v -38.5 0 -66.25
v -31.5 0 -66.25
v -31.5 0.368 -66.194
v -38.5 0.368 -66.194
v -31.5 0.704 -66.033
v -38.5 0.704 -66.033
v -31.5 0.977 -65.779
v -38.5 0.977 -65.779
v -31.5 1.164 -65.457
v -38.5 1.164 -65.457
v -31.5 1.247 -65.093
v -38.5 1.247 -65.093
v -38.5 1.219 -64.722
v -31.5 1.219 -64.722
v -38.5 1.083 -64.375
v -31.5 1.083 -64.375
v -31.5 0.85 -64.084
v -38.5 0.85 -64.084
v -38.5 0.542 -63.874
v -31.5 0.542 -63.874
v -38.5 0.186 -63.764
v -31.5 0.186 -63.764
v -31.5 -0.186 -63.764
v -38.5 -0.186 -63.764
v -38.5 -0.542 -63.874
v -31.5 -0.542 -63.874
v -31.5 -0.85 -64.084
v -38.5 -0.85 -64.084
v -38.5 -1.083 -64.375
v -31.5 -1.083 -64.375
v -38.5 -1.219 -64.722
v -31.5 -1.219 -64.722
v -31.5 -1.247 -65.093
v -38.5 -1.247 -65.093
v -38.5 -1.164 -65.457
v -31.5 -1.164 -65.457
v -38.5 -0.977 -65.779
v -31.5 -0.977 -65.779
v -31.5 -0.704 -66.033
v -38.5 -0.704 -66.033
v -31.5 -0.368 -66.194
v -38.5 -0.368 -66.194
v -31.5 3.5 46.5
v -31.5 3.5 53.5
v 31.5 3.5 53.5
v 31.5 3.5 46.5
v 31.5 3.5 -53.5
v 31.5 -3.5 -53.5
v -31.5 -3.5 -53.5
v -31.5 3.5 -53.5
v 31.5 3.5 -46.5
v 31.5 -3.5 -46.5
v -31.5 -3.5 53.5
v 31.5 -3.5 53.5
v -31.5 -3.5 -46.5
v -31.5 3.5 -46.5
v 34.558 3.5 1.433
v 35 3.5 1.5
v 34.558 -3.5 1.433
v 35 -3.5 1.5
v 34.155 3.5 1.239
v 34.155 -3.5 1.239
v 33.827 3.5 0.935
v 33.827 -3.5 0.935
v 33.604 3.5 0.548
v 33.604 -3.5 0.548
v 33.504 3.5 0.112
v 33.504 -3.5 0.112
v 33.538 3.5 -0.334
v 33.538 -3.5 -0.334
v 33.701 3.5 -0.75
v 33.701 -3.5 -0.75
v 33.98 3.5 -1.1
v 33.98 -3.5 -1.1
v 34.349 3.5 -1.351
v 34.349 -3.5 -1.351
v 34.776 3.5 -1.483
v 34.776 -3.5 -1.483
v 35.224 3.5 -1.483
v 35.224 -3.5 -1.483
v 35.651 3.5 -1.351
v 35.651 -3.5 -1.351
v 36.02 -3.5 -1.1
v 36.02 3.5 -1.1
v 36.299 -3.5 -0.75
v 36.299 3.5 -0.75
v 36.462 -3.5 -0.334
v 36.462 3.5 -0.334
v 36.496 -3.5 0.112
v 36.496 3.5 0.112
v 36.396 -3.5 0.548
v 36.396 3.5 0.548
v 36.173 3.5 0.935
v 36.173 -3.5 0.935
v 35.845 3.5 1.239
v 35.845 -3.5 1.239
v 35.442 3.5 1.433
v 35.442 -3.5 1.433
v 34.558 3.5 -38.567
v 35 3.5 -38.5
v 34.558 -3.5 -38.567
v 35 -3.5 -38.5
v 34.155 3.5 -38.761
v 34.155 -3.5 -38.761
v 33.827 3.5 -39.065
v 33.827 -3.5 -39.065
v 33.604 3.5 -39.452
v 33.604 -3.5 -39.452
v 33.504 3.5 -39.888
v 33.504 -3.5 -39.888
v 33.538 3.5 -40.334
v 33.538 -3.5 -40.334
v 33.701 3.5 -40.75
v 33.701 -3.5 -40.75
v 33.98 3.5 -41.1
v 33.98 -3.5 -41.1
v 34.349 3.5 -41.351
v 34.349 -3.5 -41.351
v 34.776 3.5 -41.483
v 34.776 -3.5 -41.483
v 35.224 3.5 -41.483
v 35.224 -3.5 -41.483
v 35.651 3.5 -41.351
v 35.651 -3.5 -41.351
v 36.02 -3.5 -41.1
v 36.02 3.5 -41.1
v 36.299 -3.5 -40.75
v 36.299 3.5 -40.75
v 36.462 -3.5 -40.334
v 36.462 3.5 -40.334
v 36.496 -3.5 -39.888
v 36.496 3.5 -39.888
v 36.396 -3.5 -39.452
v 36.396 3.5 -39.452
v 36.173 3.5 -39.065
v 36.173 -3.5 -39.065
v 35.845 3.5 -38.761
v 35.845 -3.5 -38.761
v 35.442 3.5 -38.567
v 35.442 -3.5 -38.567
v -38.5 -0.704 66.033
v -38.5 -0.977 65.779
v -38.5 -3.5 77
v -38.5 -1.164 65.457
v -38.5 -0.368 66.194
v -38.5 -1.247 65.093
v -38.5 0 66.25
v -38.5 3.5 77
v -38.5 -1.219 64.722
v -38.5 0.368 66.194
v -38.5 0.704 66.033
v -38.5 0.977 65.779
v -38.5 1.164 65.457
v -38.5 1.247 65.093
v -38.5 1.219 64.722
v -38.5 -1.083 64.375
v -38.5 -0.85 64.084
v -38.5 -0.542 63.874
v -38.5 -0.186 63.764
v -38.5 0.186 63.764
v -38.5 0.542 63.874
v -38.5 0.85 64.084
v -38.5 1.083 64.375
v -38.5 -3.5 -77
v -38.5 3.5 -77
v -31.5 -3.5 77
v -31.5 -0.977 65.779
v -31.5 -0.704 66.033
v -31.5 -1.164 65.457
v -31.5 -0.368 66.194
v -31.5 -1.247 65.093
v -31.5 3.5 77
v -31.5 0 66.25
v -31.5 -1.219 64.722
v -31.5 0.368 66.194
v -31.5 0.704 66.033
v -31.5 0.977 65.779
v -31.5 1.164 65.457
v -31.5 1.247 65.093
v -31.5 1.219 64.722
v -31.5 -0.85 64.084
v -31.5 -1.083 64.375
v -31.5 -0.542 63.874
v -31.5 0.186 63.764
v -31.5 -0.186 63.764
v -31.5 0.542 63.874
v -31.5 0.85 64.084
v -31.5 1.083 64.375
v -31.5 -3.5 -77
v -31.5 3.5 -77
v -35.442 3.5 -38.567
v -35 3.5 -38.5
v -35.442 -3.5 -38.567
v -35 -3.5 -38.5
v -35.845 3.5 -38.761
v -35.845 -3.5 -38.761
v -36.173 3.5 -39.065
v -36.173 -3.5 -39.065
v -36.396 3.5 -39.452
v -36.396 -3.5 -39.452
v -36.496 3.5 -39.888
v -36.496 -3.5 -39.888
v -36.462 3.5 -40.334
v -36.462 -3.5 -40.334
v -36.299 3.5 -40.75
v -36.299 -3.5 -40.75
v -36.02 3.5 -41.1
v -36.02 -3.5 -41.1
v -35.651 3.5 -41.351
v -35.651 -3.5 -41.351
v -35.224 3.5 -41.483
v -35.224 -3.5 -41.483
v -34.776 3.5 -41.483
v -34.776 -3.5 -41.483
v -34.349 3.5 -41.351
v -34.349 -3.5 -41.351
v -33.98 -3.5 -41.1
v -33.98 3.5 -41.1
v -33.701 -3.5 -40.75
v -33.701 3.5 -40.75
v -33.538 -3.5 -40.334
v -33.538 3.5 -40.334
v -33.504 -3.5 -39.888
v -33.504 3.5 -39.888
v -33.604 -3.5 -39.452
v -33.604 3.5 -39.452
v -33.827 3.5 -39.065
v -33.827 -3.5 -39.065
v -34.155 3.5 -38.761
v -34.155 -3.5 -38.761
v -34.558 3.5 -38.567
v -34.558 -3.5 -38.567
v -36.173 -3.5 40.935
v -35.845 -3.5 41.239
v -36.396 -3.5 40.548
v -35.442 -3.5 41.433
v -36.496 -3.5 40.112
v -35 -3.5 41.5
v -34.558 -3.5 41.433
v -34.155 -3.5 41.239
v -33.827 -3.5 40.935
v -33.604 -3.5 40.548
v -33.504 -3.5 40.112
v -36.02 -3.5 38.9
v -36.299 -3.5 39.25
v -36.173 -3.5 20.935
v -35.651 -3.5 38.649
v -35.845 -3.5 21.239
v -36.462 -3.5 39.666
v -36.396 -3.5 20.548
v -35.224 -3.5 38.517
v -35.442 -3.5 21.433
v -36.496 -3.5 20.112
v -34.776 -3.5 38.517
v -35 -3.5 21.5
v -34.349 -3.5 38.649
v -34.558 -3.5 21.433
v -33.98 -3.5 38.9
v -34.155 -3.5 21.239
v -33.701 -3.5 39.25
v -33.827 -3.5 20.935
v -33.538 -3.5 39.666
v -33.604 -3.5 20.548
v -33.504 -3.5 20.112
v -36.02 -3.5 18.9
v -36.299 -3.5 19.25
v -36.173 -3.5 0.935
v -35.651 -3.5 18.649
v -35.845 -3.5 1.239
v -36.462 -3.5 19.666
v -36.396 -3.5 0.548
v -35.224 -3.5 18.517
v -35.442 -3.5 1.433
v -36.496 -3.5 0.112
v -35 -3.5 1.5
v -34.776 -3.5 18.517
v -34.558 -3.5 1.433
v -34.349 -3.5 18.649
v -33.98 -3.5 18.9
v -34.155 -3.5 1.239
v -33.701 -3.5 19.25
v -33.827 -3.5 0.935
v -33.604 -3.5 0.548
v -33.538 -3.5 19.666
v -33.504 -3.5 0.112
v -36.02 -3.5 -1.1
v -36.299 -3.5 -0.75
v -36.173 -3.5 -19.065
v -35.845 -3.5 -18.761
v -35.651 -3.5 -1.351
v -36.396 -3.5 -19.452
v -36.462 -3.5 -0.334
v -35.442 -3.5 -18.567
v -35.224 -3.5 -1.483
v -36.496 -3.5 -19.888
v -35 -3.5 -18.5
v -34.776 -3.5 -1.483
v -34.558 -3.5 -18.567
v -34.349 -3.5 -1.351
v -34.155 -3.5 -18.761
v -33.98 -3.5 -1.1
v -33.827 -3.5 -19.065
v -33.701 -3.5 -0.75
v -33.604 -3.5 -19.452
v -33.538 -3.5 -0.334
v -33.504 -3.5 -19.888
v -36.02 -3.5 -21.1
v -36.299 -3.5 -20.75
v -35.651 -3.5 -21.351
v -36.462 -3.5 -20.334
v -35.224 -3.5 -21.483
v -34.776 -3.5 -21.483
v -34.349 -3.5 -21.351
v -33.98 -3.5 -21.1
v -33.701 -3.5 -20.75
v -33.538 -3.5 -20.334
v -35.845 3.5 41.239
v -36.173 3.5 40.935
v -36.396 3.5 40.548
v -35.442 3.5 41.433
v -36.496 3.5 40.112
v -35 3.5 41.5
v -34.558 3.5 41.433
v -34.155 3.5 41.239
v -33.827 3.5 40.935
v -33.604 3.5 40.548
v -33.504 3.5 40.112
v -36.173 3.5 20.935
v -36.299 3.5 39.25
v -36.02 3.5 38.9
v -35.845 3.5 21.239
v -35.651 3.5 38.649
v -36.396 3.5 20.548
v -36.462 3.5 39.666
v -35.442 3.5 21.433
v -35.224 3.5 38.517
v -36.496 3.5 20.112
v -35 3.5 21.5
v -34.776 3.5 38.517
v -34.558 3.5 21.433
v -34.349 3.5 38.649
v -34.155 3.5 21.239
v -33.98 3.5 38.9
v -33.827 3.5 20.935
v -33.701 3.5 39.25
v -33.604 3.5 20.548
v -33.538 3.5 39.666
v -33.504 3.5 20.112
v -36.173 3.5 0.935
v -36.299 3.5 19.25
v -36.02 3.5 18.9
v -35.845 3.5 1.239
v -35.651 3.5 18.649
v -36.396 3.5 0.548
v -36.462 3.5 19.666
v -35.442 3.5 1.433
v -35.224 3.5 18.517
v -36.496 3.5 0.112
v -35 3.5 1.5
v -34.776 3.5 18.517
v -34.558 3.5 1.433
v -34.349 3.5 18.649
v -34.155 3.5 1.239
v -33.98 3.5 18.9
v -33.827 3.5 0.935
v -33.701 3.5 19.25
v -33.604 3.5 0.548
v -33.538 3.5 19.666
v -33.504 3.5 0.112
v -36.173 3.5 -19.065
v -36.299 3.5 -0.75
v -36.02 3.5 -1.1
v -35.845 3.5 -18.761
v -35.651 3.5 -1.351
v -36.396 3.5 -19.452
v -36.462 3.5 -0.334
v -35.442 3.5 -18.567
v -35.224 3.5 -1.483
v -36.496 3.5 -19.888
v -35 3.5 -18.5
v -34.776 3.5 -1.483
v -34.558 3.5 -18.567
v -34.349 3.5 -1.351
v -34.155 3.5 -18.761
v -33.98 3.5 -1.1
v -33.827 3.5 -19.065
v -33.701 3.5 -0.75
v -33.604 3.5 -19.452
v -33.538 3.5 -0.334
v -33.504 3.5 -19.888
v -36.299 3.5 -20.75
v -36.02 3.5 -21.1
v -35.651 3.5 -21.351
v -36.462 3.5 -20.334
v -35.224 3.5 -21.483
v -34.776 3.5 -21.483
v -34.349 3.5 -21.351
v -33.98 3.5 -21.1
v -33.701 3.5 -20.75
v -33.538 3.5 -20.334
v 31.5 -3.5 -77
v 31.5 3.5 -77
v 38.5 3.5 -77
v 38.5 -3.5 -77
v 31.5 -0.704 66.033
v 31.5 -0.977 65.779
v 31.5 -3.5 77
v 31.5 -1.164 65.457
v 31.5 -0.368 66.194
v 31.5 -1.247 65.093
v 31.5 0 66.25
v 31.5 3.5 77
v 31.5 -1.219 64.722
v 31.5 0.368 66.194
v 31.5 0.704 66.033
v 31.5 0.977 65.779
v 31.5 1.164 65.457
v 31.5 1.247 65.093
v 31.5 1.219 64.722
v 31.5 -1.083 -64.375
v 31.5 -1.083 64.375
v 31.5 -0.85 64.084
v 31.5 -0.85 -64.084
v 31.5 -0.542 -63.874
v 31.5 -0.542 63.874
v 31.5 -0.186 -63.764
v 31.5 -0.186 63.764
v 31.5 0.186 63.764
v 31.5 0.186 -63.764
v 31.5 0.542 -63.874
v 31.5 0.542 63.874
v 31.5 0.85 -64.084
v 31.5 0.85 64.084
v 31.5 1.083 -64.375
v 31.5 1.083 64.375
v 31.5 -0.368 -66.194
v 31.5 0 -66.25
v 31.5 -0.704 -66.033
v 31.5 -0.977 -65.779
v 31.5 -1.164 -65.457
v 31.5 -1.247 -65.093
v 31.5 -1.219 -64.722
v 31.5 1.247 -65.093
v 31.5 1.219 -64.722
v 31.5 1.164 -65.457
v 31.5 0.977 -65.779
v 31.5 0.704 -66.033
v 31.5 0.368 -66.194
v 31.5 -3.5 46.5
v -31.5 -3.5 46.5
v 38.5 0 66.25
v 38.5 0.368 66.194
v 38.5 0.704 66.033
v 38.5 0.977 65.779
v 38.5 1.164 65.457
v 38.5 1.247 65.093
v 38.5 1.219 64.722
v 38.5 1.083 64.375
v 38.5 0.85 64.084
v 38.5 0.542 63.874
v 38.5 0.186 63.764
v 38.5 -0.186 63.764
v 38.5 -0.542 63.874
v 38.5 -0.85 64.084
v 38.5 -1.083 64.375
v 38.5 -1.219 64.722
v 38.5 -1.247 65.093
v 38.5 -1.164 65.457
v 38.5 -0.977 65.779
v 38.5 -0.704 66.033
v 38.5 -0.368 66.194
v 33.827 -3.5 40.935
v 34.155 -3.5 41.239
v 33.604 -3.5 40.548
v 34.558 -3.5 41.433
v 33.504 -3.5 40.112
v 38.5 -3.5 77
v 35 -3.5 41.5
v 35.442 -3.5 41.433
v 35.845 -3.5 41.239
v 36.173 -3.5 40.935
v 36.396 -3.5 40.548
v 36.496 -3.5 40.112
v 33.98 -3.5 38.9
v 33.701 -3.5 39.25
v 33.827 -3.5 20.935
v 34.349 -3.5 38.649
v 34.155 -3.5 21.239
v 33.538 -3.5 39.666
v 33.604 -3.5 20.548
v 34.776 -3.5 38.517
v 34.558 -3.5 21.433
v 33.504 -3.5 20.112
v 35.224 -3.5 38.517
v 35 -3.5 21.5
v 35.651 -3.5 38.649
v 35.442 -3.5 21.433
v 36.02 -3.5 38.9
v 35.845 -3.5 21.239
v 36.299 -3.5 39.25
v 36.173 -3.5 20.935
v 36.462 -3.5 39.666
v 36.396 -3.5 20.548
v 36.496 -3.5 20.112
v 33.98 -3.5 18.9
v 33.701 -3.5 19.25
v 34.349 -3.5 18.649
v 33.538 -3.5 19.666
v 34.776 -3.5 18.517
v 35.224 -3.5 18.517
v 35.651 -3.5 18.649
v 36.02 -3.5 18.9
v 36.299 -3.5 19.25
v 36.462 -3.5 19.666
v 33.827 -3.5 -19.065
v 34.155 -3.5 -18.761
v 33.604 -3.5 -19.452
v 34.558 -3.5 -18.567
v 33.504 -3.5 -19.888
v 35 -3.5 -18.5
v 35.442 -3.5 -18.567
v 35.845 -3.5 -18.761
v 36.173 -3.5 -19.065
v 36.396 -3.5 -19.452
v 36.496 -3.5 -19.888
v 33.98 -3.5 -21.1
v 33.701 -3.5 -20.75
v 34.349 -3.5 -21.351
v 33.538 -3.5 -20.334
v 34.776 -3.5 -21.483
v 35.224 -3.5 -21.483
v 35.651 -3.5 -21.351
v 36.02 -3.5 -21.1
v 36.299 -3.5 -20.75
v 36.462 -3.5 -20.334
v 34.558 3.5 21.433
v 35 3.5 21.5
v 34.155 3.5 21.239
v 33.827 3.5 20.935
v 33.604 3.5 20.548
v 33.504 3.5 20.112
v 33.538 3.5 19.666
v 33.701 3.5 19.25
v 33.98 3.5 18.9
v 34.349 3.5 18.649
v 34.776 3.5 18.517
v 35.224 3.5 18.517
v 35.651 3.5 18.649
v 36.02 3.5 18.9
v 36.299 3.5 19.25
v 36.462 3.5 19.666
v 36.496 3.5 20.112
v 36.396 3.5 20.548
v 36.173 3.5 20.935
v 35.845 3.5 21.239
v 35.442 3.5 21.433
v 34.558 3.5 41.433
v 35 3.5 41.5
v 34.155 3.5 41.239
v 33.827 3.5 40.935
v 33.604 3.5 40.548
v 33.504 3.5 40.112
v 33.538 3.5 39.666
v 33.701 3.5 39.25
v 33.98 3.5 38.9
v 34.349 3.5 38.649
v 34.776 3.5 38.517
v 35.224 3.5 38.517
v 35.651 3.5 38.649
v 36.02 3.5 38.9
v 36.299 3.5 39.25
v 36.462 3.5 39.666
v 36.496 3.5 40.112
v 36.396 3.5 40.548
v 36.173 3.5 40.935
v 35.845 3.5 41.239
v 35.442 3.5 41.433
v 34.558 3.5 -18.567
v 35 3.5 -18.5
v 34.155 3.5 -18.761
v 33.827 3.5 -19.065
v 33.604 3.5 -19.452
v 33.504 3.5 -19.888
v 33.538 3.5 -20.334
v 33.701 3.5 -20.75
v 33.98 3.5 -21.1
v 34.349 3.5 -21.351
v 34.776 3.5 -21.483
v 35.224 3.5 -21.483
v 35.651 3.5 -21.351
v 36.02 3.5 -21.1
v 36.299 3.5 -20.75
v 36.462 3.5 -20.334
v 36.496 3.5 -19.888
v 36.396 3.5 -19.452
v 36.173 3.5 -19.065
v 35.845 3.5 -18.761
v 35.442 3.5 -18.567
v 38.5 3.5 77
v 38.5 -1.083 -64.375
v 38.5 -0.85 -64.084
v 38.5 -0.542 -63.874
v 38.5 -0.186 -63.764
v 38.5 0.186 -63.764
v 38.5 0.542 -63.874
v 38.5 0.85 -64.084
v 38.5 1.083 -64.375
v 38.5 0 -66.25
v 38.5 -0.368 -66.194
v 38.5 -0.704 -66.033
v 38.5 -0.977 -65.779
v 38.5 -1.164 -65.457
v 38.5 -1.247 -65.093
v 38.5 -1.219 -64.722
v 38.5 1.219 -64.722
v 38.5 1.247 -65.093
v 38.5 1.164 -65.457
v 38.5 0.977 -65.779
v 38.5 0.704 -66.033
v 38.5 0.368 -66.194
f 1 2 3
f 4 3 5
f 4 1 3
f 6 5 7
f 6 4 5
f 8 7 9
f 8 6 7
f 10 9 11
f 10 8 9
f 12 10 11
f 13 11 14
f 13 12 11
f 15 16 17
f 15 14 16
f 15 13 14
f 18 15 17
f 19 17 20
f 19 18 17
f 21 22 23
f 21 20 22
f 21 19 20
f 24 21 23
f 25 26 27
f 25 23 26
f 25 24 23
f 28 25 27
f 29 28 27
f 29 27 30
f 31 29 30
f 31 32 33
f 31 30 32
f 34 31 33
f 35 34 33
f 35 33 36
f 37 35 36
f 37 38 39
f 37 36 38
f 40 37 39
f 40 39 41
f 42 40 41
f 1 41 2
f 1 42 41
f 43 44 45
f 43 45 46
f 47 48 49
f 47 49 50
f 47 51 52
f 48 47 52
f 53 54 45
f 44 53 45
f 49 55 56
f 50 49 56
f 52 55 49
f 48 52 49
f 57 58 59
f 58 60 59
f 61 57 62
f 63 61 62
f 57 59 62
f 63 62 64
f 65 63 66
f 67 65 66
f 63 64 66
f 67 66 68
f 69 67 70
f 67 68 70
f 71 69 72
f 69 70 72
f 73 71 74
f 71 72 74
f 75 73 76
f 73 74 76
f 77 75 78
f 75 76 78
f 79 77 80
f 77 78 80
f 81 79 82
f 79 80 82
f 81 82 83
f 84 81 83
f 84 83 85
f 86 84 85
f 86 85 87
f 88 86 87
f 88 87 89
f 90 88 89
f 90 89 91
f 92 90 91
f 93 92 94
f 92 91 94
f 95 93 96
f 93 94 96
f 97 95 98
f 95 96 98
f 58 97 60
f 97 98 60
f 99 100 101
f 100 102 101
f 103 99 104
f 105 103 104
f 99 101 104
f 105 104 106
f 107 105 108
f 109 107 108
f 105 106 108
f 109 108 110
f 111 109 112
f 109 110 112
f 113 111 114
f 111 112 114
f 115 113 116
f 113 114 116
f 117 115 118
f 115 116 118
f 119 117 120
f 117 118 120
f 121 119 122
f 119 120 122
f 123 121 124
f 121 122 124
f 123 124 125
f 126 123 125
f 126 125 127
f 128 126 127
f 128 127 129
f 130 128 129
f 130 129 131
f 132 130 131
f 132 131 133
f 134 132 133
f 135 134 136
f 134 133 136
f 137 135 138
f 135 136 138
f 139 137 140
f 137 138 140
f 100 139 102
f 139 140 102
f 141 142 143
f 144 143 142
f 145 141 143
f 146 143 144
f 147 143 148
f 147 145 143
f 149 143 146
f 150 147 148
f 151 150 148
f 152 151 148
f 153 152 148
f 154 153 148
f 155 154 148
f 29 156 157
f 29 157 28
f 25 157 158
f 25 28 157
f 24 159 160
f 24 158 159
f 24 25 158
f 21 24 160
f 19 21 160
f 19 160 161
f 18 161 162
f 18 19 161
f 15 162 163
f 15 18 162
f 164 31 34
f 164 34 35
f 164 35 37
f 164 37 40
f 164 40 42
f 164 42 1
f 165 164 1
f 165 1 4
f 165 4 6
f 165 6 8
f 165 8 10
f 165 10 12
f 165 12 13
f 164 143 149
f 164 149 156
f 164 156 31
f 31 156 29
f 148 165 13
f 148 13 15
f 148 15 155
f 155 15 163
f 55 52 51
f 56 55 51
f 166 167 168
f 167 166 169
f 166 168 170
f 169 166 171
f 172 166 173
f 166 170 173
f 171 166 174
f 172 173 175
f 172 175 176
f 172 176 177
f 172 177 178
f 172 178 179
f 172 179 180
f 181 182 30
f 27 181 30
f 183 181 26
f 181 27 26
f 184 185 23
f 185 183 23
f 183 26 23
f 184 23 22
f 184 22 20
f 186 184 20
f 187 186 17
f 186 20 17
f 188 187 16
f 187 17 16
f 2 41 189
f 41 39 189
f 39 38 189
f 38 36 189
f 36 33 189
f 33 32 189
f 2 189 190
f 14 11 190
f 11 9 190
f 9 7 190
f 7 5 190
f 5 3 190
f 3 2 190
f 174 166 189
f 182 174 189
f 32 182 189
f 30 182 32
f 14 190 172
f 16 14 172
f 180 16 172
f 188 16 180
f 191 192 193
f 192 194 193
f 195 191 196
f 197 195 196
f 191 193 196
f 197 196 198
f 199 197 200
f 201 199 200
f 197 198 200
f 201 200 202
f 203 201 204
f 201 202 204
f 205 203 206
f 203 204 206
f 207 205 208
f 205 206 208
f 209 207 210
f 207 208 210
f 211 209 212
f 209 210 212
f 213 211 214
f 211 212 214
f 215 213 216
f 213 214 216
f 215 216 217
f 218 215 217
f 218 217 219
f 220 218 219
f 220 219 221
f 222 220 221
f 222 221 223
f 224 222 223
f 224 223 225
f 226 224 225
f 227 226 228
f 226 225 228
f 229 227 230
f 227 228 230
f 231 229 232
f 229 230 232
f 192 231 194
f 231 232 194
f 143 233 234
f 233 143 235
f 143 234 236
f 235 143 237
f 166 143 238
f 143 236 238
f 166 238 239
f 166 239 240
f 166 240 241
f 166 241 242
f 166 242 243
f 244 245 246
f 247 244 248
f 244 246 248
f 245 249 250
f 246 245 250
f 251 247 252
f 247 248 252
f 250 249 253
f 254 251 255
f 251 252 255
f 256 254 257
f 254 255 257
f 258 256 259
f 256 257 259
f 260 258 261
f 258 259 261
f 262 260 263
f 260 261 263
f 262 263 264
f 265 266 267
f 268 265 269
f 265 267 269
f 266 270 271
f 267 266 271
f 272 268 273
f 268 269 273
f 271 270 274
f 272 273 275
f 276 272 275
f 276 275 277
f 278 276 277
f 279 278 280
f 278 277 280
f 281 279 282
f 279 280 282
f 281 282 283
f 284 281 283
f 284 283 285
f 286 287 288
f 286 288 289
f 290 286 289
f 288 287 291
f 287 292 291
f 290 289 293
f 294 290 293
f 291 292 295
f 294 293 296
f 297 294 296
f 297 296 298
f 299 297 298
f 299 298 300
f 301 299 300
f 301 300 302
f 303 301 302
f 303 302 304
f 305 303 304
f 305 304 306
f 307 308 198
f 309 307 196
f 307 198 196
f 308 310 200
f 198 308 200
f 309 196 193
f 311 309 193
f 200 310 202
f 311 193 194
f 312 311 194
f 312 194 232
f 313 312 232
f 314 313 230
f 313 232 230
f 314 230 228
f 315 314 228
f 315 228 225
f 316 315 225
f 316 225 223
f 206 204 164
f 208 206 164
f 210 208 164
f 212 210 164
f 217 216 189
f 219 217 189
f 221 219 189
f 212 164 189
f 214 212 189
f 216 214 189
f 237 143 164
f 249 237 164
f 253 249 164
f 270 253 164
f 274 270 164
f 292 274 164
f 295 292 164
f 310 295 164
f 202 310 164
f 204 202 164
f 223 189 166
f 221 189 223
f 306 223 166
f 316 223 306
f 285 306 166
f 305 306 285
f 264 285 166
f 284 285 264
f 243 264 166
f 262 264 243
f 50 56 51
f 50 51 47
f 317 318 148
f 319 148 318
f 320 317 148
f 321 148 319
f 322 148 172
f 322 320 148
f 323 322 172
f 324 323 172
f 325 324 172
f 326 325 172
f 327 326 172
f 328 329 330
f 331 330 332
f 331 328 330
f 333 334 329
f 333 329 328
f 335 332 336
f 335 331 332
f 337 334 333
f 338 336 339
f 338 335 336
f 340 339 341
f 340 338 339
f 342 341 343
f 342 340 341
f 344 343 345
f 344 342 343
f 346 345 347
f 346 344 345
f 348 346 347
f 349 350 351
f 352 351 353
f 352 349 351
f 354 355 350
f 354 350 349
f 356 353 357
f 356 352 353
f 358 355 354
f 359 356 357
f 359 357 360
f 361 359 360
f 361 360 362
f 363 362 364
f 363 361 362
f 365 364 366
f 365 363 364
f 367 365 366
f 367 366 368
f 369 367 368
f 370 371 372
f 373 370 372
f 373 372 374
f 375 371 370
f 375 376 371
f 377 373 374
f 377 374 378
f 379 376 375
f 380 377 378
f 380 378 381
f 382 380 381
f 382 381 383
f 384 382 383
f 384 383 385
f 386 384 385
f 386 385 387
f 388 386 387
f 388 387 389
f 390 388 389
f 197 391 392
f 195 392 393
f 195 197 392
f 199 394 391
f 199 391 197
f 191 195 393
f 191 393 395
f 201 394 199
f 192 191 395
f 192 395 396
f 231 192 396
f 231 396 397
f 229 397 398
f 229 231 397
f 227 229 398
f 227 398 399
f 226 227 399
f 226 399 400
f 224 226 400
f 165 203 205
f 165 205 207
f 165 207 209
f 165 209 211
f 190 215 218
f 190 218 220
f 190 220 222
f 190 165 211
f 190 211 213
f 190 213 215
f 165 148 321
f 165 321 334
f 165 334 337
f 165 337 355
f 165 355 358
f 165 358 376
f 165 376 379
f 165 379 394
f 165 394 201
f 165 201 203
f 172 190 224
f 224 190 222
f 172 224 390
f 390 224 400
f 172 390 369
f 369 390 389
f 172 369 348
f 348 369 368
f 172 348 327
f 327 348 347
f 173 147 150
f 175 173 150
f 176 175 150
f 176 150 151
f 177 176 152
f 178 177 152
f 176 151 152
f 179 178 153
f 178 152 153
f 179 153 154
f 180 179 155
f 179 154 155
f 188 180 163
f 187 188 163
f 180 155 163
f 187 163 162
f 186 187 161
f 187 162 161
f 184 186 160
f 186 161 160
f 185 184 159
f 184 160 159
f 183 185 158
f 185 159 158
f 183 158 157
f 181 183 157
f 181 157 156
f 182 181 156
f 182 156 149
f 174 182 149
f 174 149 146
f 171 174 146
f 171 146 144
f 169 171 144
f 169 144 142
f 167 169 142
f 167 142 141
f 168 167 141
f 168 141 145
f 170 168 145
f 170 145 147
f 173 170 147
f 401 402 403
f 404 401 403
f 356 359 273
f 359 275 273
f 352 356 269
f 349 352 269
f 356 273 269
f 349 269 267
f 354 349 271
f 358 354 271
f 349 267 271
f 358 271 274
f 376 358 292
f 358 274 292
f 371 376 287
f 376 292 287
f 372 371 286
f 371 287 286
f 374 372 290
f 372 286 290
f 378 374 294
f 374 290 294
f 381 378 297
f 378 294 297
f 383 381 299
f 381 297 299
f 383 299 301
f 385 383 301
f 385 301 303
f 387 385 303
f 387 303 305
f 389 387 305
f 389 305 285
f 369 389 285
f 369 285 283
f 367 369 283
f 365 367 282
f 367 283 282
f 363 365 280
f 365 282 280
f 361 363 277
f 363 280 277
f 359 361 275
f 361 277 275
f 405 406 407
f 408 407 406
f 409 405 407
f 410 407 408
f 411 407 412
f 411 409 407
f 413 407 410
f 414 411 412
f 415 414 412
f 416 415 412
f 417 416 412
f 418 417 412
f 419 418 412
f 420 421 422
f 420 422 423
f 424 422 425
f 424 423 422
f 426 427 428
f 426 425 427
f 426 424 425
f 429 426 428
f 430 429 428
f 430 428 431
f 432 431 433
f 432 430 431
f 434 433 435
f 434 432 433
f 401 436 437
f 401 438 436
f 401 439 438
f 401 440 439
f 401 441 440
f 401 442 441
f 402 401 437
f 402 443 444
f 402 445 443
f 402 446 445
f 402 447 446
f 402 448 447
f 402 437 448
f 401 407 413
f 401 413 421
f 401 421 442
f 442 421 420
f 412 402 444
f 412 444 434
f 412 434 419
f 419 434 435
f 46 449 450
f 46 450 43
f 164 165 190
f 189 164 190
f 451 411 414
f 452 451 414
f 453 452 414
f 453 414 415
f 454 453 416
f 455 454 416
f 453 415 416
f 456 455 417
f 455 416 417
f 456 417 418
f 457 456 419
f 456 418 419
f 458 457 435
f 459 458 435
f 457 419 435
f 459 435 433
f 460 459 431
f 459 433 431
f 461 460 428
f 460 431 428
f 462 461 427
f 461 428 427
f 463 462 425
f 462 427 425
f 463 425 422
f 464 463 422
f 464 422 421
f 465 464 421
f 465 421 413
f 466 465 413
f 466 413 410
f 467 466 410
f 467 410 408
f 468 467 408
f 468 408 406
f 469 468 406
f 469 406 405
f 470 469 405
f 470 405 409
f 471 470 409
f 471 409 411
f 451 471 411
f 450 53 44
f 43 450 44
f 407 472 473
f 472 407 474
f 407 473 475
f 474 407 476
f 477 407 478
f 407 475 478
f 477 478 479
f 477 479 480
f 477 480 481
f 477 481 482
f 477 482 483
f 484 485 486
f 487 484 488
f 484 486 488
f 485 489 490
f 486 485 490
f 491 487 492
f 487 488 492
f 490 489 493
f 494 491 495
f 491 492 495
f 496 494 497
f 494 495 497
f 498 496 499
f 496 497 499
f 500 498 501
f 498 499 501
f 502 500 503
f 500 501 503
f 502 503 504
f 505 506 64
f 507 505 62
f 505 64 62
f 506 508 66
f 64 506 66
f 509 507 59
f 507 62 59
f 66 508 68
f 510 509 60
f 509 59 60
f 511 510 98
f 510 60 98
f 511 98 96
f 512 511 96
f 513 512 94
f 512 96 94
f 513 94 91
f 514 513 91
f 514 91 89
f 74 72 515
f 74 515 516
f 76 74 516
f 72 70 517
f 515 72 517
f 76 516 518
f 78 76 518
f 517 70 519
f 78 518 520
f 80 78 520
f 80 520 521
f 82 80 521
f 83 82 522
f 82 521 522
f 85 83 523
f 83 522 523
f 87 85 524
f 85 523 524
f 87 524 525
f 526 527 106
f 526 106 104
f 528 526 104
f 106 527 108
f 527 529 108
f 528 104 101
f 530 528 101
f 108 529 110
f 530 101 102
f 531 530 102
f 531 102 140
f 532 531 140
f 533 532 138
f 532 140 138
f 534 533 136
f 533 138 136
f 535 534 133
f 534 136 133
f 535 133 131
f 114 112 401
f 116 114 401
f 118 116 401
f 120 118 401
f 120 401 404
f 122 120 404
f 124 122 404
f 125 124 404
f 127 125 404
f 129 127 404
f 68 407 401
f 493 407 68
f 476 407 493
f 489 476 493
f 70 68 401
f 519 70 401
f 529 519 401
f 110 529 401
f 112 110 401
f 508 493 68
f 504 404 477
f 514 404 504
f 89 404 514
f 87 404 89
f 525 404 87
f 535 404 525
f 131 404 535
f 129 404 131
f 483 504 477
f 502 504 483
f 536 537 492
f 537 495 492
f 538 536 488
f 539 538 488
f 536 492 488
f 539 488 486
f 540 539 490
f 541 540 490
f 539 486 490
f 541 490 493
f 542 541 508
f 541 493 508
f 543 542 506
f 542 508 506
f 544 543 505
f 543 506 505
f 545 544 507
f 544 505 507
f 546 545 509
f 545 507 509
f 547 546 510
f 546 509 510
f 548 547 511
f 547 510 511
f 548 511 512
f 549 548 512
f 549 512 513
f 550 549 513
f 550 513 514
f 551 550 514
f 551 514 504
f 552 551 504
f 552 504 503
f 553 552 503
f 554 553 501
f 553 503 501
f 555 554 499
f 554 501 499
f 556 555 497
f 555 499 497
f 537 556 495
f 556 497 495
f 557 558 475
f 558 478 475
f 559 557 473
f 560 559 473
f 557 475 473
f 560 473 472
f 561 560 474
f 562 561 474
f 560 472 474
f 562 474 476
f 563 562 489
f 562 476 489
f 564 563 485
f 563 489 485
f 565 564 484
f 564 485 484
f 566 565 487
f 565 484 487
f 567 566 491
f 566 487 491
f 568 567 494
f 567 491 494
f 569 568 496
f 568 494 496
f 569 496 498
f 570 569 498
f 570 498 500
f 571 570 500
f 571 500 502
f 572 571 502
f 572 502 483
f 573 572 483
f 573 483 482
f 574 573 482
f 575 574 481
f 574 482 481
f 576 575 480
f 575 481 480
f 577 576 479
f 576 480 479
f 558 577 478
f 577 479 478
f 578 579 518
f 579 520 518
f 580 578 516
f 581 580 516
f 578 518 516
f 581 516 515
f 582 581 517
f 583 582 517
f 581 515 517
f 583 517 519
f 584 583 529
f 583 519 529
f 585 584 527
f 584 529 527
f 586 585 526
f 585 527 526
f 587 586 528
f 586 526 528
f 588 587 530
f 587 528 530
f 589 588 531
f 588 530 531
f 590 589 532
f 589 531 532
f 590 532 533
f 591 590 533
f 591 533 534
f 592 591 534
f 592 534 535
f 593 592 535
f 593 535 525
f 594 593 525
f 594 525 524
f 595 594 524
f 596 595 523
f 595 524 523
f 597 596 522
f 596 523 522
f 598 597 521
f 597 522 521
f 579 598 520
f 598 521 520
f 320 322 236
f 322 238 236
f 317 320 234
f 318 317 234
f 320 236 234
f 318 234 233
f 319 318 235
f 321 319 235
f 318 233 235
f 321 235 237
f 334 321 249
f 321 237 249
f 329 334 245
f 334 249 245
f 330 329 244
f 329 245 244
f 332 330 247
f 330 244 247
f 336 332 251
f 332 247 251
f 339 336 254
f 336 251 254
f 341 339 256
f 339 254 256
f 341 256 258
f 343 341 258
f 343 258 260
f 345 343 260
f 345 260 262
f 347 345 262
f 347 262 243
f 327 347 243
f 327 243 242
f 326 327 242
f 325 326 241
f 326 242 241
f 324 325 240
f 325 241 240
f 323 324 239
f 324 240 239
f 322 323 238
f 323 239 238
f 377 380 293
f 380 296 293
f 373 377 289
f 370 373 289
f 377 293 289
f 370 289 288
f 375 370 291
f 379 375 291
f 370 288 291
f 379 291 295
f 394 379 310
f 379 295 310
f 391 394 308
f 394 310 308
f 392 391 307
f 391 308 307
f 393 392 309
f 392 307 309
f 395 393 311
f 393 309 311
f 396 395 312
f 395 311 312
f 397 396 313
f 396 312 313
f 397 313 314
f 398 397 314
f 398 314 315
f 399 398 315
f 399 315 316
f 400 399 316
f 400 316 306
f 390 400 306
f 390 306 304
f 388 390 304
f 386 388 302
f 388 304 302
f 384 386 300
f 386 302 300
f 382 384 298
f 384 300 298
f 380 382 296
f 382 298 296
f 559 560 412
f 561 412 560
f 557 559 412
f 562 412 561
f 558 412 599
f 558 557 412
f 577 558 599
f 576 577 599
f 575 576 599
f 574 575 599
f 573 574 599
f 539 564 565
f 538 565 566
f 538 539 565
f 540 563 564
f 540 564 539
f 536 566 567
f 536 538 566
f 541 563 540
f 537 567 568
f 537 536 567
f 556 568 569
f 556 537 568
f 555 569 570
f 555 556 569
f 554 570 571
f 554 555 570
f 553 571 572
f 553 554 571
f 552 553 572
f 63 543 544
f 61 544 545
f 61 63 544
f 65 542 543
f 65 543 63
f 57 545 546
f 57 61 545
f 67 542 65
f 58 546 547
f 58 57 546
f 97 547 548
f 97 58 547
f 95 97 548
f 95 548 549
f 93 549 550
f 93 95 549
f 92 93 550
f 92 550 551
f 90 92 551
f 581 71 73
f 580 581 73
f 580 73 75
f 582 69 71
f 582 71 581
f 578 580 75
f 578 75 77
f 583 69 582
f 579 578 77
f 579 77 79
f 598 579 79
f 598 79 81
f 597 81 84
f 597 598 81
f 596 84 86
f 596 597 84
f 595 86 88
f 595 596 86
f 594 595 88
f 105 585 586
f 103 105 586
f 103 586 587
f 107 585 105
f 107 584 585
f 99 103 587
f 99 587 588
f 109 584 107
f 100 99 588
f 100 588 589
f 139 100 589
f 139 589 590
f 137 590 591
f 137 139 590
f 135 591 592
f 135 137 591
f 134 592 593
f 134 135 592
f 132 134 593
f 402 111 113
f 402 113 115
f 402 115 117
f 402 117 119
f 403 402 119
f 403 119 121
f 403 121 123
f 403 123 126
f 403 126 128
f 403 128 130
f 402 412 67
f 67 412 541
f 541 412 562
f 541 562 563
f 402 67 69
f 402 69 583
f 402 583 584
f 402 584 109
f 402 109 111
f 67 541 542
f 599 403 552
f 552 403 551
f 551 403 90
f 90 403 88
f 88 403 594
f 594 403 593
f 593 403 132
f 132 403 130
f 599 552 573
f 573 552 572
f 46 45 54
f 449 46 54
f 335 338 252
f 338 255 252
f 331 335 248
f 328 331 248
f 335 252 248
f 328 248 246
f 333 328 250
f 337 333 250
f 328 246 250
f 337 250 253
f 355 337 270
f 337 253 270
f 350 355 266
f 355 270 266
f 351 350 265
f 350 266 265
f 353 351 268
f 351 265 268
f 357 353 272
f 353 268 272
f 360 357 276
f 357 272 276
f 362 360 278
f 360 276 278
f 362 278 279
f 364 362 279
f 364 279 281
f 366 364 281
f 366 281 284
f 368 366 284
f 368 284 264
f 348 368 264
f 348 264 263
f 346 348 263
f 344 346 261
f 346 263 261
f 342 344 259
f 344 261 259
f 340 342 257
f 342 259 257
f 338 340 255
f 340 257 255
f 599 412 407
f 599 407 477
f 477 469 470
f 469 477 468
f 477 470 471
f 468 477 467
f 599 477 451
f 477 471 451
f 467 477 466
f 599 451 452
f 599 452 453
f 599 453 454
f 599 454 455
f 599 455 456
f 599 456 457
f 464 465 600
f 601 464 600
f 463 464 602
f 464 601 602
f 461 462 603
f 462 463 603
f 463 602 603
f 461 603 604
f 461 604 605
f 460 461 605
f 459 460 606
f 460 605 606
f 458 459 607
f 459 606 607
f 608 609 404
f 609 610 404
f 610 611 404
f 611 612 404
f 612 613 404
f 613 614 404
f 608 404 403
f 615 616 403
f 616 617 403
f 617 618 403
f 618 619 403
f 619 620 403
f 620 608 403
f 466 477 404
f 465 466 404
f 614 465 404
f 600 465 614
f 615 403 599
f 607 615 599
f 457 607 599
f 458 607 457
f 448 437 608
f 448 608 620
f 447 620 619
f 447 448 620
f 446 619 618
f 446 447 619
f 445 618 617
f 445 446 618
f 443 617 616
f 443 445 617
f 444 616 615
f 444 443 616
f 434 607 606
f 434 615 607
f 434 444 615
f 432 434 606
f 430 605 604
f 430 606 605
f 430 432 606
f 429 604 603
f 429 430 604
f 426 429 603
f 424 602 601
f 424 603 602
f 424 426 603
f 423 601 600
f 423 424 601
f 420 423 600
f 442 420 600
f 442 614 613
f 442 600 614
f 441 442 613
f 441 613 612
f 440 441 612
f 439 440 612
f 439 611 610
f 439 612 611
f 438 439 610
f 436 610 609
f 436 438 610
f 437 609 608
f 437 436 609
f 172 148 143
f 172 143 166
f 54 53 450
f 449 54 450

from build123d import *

# Parameters (mm, degrees)
SKETCH_14_W                   = 7
SKETCH_14_H                   = 7
BAR_7X7_1_DEPTH               = 154
SKETCH_14_ON_SEGMENT_2_W      = 7
SKETCH_14_ON_SEGMENT_2_H      = 7
BAR_7X7_1_2_DEPTH             = 154
SKETCH_14_ON_SEGMENT_3_W      = 7
SKETCH_14_ON_SEGMENT_3_H      = 7
BAR_7X7_1_3_DEPTH             = 72
SKETCH_14_ON_SEGMENT_4_W      = 7
SKETCH_14_ON_SEGMENT_4_H      = 7
BAR_7X7_1_4_DEPTH             = 72
SKETCH_12_R                   = 1.25
CUT_EXTRUDE_1_DEPTH           = 128.848543206
SKETCH_16_W                   = 1.5
SKETCH_16_H                   = 7
MM_TRANSITIONAL_1_AT_2_COUNT  = 2
MM_TRANSITIONAL_1_AT_2_PITCH  = 20
MM_TRANSITIONAL_1_AT_3_COUNT  = 2
MM_TRANSITIONAL_1_AT_3_PITCH  = 40
MM_TRANSITIONAL_1_AT_4_COUNT  = 2
MM_TRANSITIONAL_1_AT_4_PITCH  = 40
MM_TRANSITIONAL_1_AT_5_COUNT  = 2
MM_TRANSITIONAL_1_AT_5_PITCH  = 20
MM_TRANSITIONAL_1_AT_6_COUNT  = 2
MM_TRANSITIONAL_1_AT_6_PITCH  = 72.801098893
MM_TRANSITIONAL_1_AT_7_COUNT  = 2
MM_TRANSITIONAL_1_AT_7_PITCH  = 80.622577483
MM_TRANSITIONAL_1_AT_8_COUNT  = 2
MM_TRANSITIONAL_1_AT_8_PITCH  = 80.622577483
MM_TRANSITIONAL_1_AT_9_COUNT  = 2
MM_TRANSITIONAL_1_AT_9_PITCH  = 72.801098893
MM_TRANSITIONAL_1_AT_10_COUNT = 2
MM_TRANSITIONAL_1_AT_10_PITCH = 70


with BuildPart() as part:
    # 草图14 → Bar 7X7(1) (new body)
    with BuildSketch(Plane(origin=(-35, 0, -77), x_dir=(1, 0, 0), z_dir=(0, 0, 1))):
        Rectangle(SKETCH_14_W, SKETCH_14_H)
    extrude(amount=BAR_7X7_1_DEPTH)


with BuildPart() as body_2:
    # 草图14 on segment 2 (carried to segment 2) → Bar 7X7_1 2 (new body)
    with BuildSketch(Plane(origin=(35, 0, -77), x_dir=(1, 0, 0), z_dir=(0, 0, 1))):
        Rectangle(SKETCH_14_ON_SEGMENT_2_W, SKETCH_14_ON_SEGMENT_2_H)
    extrude(amount=BAR_7X7_1_2_DEPTH)


with BuildPart() as body_3:
    # 草图14 on segment 3 (carried to segment 3) → Bar 7X7_1 3 (new body)
    with BuildSketch(Plane(origin=(-36, 0, -50), x_dir=(0, 0, -1), z_dir=(1, 0, 0))):
        Rectangle(SKETCH_14_ON_SEGMENT_3_W, SKETCH_14_ON_SEGMENT_3_H)
    extrude(amount=BAR_7X7_1_3_DEPTH)

    # Bar 7X7_1 3 end butt 1
    split(bisect_by=Plane(origin=(-31.5, 0, -50), x_dir=(0, 1, 0), z_dir=(1, 0, 0)), keep=Keep.TOP)

    # Bar 7X7_1 3 end butt 2
    split(bisect_by=Plane(origin=(31.5, 0, -50), x_dir=(0, -1, 0), z_dir=(-1, 0, 0)), keep=Keep.TOP)


with BuildPart() as body_4:
    # 草图14 on segment 4 (carried to segment 4) → Bar 7X7_1 4 (new body)
    with BuildSketch(Plane(origin=(-36, 0, 50), x_dir=(0, 0, -1), z_dir=(1, 0, 0))):
        Rectangle(SKETCH_14_ON_SEGMENT_4_W, SKETCH_14_ON_SEGMENT_4_H)
    extrude(amount=BAR_7X7_1_4_DEPTH)

    # Bar 7X7_1 4 end butt 1
    split(bisect_by=Plane(origin=(-31.5, 0, 50), x_dir=(0, 1, 0), z_dir=(1, 0, 0)), keep=Keep.TOP)

    # Bar 7X7_1 4 end butt 2
    split(bisect_by=Plane(origin=(31.5, 0, 50), x_dir=(0, -1, 0), z_dir=(-1, 0, 0)), keep=Keep.TOP)


with BuildPart() as cut_extrude_1_tool:
    # 草图12 → 切除-拉伸1 (new, through all)
    with BuildSketch(Plane(origin=(-38.5, 0, 25), x_dir=(0, 0, -1), z_dir=(1, 0, 0))):
        with Locations((90, 0)):
            Circle(SKETCH_12_R)
    cut_extrude_1 = extrude(amount=CUT_EXTRUDE_1_DEPTH)


with BuildPart() as part_1:
    add(part.part)

    # 切除-拉伸1: cut by cut_extrude_1_tool
    add(cut_extrude_1_tool.part, mode=Mode.SUBTRACT)


with BuildPart() as body_2_1:
    add(body_2.part)

    # 切除-拉伸1: cut by cut_extrude_1_tool
    add(cut_extrude_1_tool.part, mode=Mode.SUBTRACT)


with BuildPart() as mirror_1_tool:
    # 镜向1: 切除-拉伸1 across plane
    add(cut_extrude_1.mirror(Plane.XY))


with BuildPart() as part_2:
    add(part_1.part)

    # 镜向1: cut by mirror_1_tool
    add(mirror_1_tool.part, mode=Mode.SUBTRACT)

    # 草图16 → 大小mm Transitional 暗销孔1 (revolve, cut)
    with BuildSketch(Plane(origin=(-35, 3.5, 0), x_dir=(0, 0, 1), z_dir=(1, 0, 0))):
        with Locations((0.75, 3.5)):
            Rectangle(SKETCH_16_W, SKETCH_16_H)
    mm_transitional_1 = revolve(axis=Axis((-35, 9.85, 0), (0, -1, 0)), mode=Mode.SUBTRACT)

    # 大小mm Transitional 暗销孔1 at 2: 大小mm Transitional 暗销孔1 ×2
    with Locations(*[(0, 0, -i * MM_TRANSITIONAL_1_AT_2_PITCH) for i in range(1, MM_TRANSITIONAL_1_AT_2_COUNT)]):
        add(mm_transitional_1, mode=Mode.SUBTRACT)

    # 大小mm Transitional 暗销孔1 at 3: 大小mm Transitional 暗销孔1 ×2
    with Locations(*[(0, 0, -i * MM_TRANSITIONAL_1_AT_3_PITCH) for i in range(1, MM_TRANSITIONAL_1_AT_3_COUNT)]):
        add(mm_transitional_1, mode=Mode.SUBTRACT)

    # 大小mm Transitional 暗销孔1 at 4: 大小mm Transitional 暗销孔1 ×2
    with Locations(*[(0, 0, i * MM_TRANSITIONAL_1_AT_4_PITCH) for i in range(1, MM_TRANSITIONAL_1_AT_4_COUNT)]):
        add(mm_transitional_1, mode=Mode.SUBTRACT)

    # 大小mm Transitional 暗销孔1 at 5: 大小mm Transitional 暗销孔1 ×2
    with Locations(*[(0, 0, i * MM_TRANSITIONAL_1_AT_5_PITCH) for i in range(1, MM_TRANSITIONAL_1_AT_5_COUNT)]):
        add(mm_transitional_1, mode=Mode.SUBTRACT)


with BuildPart() as body_2_2:
    add(body_2_1.part)

    # 镜向1: cut by mirror_1_tool
    add(mirror_1_tool.part, mode=Mode.SUBTRACT)

    # 大小mm Transitional 暗销孔1 at 6: 大小mm Transitional 暗销孔1 ×2
    with Locations(*[Vector(0.9615239476407995, 0, 0.27472112789746117) * (i * MM_TRANSITIONAL_1_AT_6_PITCH) for i in range(1, MM_TRANSITIONAL_1_AT_6_COUNT)]):
        add(mm_transitional_1, mode=Mode.SUBTRACT)

    # 大小mm Transitional 暗销孔1 at 7: 大小mm Transitional 暗销孔1 ×2
    with Locations(*[Vector(0.8682431421243894, 0, 0.4961389383569561) * (i * MM_TRANSITIONAL_1_AT_7_PITCH) for i in range(1, MM_TRANSITIONAL_1_AT_7_COUNT)]):
        add(mm_transitional_1, mode=Mode.SUBTRACT)

    # 大小mm Transitional 暗销孔1 at 8: 大小mm Transitional 暗销孔1 ×2
    with Locations(*[Vector(0.8682431421243892, 0, -0.49613893835695644) * (i * MM_TRANSITIONAL_1_AT_8_PITCH) for i in range(1, MM_TRANSITIONAL_1_AT_8_COUNT)]):
        add(mm_transitional_1, mode=Mode.SUBTRACT)

    # 大小mm Transitional 暗销孔1 at 9: 大小mm Transitional 暗销孔1 ×2
    with Locations(*[Vector(0.9615239476407993, 0, -0.27472112789746156) * (i * MM_TRANSITIONAL_1_AT_9_PITCH) for i in range(1, MM_TRANSITIONAL_1_AT_9_COUNT)]):
        add(mm_transitional_1, mode=Mode.SUBTRACT)

    # 大小mm Transitional 暗销孔1 at 10: 大小mm Transitional 暗销孔1 ×2
    with Locations(*[(i * MM_TRANSITIONAL_1_AT_10_PITCH, 0, 0) for i in range(1, MM_TRANSITIONAL_1_AT_10_COUNT)]):
        add(mm_transitional_1, mode=Mode.SUBTRACT)


solid = Compound([body_3.part, body_4.part, part_2.part, body_2_2.part])
